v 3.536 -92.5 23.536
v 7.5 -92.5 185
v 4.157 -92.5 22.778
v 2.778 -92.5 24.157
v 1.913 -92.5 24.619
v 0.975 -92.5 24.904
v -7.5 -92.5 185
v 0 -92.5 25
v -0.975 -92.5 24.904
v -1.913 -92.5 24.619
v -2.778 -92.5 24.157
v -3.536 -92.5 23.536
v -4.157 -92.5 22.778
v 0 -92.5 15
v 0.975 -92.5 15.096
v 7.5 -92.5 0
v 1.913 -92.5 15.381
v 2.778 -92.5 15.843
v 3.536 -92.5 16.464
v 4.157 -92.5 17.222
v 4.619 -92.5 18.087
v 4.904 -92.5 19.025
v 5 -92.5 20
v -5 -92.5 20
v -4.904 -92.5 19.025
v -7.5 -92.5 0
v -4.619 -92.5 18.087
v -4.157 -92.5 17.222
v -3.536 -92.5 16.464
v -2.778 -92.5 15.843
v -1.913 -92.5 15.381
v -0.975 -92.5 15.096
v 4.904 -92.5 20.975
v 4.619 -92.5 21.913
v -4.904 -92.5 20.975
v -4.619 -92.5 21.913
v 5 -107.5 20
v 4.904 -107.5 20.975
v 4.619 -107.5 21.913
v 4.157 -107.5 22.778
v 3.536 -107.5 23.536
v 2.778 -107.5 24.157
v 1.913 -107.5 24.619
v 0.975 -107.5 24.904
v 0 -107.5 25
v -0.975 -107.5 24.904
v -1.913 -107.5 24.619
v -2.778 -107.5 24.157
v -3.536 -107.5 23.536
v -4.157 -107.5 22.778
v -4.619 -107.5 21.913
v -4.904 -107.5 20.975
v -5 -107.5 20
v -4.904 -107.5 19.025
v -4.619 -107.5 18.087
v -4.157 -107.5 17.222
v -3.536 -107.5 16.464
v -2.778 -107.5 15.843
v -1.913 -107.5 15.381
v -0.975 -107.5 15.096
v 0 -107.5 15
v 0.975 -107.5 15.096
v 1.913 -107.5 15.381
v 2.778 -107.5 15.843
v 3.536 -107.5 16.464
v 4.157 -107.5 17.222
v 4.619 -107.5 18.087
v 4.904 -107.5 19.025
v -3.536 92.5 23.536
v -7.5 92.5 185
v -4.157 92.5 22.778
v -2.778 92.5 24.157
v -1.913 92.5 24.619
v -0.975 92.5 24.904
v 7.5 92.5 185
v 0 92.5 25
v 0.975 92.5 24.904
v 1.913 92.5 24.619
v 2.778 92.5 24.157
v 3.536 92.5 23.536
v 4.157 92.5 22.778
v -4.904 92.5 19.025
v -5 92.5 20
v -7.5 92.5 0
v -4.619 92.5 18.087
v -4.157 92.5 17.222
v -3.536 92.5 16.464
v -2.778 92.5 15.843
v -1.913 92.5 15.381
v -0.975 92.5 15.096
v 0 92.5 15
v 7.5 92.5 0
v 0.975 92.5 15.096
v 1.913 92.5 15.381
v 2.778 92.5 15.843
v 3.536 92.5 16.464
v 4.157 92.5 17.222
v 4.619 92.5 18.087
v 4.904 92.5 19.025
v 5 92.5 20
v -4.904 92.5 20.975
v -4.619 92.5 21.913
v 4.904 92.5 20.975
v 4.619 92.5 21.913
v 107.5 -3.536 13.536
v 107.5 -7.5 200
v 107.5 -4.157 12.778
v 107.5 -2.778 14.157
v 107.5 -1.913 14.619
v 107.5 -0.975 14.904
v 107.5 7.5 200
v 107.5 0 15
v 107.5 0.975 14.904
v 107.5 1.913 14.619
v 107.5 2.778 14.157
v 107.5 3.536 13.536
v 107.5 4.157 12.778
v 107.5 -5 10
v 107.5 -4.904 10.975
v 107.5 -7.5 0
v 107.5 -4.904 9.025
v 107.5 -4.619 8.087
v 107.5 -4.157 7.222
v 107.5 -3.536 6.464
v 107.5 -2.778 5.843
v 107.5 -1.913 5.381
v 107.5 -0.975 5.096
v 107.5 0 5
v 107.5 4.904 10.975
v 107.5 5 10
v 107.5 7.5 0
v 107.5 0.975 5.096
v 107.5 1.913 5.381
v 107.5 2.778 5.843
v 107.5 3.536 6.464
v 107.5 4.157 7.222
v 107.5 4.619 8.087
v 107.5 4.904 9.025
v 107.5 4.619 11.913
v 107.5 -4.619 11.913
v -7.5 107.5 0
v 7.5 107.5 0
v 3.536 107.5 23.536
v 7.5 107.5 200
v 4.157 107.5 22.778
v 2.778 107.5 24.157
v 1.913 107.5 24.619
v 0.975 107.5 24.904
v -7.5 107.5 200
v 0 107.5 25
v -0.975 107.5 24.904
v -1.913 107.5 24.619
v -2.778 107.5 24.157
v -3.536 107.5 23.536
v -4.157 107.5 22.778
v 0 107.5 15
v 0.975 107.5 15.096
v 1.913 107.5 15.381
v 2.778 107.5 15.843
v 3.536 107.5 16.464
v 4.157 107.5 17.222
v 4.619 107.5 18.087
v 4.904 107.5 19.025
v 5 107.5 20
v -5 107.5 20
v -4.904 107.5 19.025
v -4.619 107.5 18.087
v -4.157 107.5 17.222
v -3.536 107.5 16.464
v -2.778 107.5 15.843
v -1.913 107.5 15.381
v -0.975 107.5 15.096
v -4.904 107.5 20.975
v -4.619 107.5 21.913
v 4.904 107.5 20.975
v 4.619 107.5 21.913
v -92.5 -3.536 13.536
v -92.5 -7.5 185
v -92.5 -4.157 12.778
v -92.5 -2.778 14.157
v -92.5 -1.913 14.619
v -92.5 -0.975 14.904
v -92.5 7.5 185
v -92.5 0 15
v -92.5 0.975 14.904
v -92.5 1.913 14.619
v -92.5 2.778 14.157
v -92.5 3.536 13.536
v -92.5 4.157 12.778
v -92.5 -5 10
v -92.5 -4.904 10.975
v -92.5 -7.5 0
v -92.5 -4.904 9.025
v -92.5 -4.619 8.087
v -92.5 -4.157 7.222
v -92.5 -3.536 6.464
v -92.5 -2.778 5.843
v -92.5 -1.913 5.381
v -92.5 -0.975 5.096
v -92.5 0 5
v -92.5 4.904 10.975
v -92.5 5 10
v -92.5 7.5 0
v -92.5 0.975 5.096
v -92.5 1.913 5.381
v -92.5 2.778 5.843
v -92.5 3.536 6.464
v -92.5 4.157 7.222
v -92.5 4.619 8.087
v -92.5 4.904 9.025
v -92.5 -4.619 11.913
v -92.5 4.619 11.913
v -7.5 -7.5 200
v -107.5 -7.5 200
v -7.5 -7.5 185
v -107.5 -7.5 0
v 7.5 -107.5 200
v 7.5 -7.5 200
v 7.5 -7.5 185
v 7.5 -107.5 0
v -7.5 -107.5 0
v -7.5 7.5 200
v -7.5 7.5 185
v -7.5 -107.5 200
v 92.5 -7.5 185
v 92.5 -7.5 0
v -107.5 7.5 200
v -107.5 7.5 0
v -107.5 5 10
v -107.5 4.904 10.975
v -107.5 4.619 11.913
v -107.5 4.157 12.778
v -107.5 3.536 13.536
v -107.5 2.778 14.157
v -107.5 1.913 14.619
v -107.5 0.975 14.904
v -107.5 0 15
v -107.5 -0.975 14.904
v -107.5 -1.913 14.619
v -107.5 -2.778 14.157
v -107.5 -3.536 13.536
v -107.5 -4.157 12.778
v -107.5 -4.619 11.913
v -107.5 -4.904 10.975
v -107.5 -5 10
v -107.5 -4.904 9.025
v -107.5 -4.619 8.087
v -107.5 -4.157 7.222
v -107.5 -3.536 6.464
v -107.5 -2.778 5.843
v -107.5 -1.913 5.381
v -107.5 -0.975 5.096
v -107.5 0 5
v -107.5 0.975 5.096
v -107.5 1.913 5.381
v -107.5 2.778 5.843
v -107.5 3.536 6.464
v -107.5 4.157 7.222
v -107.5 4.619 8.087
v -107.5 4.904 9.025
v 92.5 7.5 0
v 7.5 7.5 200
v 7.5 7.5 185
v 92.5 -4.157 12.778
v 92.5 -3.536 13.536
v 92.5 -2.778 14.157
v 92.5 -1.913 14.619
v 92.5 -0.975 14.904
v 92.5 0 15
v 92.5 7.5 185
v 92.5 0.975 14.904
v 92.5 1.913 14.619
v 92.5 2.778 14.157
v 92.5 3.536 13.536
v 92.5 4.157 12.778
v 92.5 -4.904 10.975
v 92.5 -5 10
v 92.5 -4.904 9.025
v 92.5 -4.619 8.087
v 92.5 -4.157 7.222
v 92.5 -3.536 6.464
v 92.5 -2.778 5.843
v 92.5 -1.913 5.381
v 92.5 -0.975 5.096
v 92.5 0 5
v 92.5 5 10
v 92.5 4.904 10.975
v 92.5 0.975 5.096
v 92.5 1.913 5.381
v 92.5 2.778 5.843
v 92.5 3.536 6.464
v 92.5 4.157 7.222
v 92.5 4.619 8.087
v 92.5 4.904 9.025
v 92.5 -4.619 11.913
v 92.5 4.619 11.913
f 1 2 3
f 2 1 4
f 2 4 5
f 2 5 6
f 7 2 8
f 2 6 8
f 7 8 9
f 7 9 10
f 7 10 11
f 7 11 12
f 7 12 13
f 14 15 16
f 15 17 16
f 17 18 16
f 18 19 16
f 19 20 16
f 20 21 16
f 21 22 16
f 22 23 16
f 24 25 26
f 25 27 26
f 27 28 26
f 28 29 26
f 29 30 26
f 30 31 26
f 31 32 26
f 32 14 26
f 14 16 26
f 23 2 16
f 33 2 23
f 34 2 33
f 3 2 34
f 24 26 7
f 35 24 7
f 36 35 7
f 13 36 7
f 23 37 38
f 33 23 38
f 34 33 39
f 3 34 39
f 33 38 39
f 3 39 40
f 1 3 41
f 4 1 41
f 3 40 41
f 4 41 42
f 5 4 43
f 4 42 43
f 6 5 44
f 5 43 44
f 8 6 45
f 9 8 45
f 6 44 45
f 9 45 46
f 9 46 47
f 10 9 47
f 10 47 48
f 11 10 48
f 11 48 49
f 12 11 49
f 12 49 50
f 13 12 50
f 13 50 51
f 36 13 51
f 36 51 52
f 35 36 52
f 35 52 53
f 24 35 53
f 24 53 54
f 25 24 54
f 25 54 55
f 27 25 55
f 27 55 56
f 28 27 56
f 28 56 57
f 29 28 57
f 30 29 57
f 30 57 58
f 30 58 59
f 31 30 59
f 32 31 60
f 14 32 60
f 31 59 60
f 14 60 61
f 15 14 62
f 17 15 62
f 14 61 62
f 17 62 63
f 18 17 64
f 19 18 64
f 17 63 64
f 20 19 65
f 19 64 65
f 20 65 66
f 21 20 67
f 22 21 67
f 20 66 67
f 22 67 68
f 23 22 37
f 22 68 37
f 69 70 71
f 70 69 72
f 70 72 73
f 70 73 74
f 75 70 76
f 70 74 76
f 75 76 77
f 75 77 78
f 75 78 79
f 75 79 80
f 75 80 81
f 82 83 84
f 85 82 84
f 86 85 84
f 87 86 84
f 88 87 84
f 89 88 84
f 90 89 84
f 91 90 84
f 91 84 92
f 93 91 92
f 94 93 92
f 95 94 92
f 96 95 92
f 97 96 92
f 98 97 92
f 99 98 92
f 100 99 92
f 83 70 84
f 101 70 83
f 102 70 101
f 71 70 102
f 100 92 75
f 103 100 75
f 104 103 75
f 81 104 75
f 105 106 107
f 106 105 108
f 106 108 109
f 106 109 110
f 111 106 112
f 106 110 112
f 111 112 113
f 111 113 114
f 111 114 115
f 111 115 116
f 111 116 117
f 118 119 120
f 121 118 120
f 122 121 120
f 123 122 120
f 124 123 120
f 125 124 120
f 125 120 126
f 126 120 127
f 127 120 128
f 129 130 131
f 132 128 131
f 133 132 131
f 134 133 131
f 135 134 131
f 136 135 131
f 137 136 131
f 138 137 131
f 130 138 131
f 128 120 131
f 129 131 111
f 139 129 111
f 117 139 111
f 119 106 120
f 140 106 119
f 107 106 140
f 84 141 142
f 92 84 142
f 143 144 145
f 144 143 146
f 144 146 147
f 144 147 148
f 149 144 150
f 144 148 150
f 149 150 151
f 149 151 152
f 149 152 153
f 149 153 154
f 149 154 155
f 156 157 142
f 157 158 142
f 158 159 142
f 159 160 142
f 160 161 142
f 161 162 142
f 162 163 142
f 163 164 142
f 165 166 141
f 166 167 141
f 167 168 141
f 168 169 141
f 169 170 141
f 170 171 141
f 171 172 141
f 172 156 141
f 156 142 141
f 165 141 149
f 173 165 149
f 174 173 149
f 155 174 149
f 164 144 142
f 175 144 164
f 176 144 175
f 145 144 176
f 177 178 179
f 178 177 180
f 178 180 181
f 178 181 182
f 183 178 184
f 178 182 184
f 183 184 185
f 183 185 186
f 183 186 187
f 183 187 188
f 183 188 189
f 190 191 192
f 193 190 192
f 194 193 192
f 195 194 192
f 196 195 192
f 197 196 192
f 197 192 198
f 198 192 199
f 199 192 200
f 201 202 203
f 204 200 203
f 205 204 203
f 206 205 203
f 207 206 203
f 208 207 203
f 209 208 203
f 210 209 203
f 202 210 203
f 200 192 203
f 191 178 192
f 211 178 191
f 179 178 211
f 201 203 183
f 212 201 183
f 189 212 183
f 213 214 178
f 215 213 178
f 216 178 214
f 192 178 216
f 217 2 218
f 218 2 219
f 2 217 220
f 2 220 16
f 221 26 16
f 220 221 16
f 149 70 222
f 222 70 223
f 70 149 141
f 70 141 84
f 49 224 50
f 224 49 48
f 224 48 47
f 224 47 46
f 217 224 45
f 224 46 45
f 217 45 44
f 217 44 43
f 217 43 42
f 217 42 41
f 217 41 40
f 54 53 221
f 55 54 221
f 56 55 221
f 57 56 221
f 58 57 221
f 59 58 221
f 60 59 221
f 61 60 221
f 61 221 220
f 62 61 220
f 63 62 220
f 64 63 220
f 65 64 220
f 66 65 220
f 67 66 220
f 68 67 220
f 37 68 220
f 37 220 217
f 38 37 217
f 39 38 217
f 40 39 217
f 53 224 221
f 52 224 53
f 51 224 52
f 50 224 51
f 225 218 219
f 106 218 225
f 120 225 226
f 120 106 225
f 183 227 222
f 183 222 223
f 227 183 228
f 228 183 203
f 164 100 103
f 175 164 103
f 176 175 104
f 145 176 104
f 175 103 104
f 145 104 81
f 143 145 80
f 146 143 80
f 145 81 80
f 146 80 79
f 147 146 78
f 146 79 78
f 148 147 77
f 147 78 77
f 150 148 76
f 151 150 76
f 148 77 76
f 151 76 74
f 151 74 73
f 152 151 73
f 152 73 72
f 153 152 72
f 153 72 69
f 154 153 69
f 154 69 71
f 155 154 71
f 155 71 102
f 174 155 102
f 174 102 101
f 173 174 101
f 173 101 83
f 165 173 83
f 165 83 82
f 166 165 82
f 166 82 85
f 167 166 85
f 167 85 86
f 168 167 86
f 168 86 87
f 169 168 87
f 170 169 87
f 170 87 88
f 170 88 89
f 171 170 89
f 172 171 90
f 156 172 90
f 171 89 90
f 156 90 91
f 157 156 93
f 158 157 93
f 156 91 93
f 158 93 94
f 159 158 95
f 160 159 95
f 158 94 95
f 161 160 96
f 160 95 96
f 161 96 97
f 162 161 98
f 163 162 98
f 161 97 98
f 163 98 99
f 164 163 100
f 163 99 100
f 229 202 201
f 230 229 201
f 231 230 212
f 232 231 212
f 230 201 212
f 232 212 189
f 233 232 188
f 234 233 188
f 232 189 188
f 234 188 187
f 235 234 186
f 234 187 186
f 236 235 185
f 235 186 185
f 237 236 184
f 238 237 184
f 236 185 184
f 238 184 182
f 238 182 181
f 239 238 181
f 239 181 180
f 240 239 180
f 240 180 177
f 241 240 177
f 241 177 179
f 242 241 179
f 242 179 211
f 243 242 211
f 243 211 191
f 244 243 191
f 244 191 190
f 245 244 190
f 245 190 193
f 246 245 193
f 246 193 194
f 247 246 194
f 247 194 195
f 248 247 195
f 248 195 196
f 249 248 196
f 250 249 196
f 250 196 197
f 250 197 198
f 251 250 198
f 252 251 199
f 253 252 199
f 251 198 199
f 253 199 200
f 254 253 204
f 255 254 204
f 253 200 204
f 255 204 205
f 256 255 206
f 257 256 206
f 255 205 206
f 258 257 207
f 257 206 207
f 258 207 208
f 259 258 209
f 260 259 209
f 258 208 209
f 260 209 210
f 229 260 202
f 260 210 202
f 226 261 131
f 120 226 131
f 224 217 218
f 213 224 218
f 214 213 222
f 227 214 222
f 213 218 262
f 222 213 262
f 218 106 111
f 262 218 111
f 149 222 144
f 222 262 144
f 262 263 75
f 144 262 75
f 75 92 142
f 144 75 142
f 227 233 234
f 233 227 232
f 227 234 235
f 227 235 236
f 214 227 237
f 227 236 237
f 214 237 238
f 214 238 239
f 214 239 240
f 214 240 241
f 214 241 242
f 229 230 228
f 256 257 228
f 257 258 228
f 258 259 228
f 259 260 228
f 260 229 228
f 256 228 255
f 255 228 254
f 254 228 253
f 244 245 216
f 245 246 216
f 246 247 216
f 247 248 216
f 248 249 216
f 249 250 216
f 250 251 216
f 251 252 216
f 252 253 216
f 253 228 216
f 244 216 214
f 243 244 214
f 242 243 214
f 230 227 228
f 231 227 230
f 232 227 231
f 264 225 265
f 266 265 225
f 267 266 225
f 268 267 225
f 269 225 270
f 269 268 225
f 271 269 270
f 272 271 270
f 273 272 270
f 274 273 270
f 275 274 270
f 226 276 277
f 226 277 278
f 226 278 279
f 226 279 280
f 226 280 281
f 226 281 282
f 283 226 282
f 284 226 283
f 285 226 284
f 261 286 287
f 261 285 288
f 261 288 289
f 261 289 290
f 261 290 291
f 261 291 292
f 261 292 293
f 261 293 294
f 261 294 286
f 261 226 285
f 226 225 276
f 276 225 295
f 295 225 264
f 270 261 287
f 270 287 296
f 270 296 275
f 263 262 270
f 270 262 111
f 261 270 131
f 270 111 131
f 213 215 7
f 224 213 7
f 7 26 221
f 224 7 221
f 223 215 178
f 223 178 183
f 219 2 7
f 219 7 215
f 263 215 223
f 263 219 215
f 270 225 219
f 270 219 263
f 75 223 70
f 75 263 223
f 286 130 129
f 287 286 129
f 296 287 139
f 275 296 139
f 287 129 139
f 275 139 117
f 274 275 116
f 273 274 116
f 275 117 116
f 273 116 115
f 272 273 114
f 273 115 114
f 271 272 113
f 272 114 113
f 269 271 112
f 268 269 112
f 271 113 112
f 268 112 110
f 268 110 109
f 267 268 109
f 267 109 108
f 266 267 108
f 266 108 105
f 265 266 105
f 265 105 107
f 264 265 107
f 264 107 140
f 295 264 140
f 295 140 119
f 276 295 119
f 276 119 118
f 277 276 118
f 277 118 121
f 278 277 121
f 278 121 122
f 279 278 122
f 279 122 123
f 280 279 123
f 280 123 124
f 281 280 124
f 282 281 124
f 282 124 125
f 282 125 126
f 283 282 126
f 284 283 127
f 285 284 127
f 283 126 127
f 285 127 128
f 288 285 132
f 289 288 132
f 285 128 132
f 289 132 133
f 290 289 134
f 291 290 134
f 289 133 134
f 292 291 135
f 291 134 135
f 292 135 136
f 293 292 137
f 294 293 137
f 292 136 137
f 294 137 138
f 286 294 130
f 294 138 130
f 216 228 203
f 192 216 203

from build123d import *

# Parameters (mm, degrees)
SKETCH1_W           = 15
SKETCH1_H           = 15
BOSS_EXTRUDE2_DEPTH = 200
SKETCH2_W           = 15
SKETCH2_H           = 15
BOSS_EXTRUDE3_DEPTH = 215
SKETCH3_W           = 15
SKETCH3_H           = 15
BOSS_EXTRUDE4_DEPTH = 215
SKETCH4_R           = 5
CUT_EXTRUDE1_DEPTH  = 313.699936041
SKETCH5_R           = 5
CUT_EXTRUDE3_DEPTH  = 313.699936041


with BuildPart() as part:
    # Sketch1 → Boss-Extrude2 (new body)
    with BuildSketch(Plane.XY):
        with BuildLine():
            ThreePointArc((-7.5, 99.718353376), (0, 100), (7.5, 99.718353376))
            Line((7.5, 99.718353376), (7.5, 107.5))
            Line((7.5, 107.5), (-7.5, 107.5))
            Line((-7.5, 107.5), (-7.5, 99.718353376))
        make_face()
        with BuildLine():
            Line((7.5, 92.5), (7.5, 99.718353376))
            ThreePointArc((7.5, 99.718353376), (0, 100), (-7.5, 99.718353376))
            Line((-7.5, 99.718353376), (-7.5, 92.5))
            Line((-7.5, 92.5), (7.5, 92.5))
        make_face()
        with BuildLine():
            ThreePointArc((-99.718353376, 7.5), (-100, 0), (-99.718353376, -7.5))
            Line((-99.718353376, -7.5), (-92.5, -7.5))
            Line((-92.5, -7.5), (-92.5, 7.5))
            Line((-92.5, 7.5), (-99.718353376, 7.5))
        make_face()
        with BuildLine():
            Line((-107.5, -7.5), (-99.718353376, -7.5))
            ThreePointArc((-99.718353376, -7.5), (-100, 0), (-99.718353376, 7.5))
            Line((-99.718353376, 7.5), (-107.5, 7.5))
            Line((-107.5, 7.5), (-107.5, -7.5))
        make_face()
        with BuildLine():
            ThreePointArc((-7.5, -99.718353376), (0, -100), (7.5, -99.718353376))
            Line((7.5, -99.718353376), (7.5, -92.5))
            Line((7.5, -92.5), (-7.5, -92.5))
            Line((-7.5, -92.5), (-7.5, -99.718353376))
        make_face()
        with BuildLine():
            Line((7.5, -107.5), (7.5, -99.718353376))
            ThreePointArc((7.5, -99.718353376), (0, -100), (-7.5, -99.718353376))
            Line((-7.5, -99.718353376), (-7.5, -107.5))
            Line((-7.5, -107.5), (7.5, -107.5))
        make_face()
        with Locations((100, 0)):
            Rectangle(SKETCH1_W, SKETCH1_H)
    extrude(amount=BOSS_EXTRUDE2_DEPTH)

    # Sketch2 → Boss-Extrude3 (add)
    with BuildSketch(Plane.XZ.offset(107.5)):
        with Locations((0, 192.5)):
            Rectangle(SKETCH2_W, SKETCH2_H)
    extrude(amount=-BOSS_EXTRUDE3_DEPTH)

    # Sketch3 → Boss-Extrude4 (add)
    with BuildSketch(Plane(origin=(107.5, 0, 0), x_dir=(0, 0, -1), z_dir=(1, 0, 0))):
        with Locations((-192.5, 0)):
            Rectangle(SKETCH3_W, SKETCH3_H)
    extrude(amount=-BOSS_EXTRUDE4_DEPTH)

    # Sketch4 → Cut-Extrude1 (cut, through all)
    with BuildSketch(Plane(origin=(107.5, 0, 0), x_dir=(0, 0, -1), z_dir=(1, 0, 0))):
        with Locations(Location((-10, 0, 0), (0, 0, 90))):
            Circle(SKETCH4_R)
    extrude(amount=-CUT_EXTRUDE1_DEPTH, mode=Mode.SUBTRACT)

    # Sketch5 → Cut-Extrude3 (cut, through all)
    with BuildSketch(Plane.XZ.offset(107.5)):
        with Locations((0, 20)):
            Circle(SKETCH5_R)
    extrude(amount=-CUT_EXTRUDE3_DEPTH, mode=Mode.SUBTRACT)


solid = part.part
